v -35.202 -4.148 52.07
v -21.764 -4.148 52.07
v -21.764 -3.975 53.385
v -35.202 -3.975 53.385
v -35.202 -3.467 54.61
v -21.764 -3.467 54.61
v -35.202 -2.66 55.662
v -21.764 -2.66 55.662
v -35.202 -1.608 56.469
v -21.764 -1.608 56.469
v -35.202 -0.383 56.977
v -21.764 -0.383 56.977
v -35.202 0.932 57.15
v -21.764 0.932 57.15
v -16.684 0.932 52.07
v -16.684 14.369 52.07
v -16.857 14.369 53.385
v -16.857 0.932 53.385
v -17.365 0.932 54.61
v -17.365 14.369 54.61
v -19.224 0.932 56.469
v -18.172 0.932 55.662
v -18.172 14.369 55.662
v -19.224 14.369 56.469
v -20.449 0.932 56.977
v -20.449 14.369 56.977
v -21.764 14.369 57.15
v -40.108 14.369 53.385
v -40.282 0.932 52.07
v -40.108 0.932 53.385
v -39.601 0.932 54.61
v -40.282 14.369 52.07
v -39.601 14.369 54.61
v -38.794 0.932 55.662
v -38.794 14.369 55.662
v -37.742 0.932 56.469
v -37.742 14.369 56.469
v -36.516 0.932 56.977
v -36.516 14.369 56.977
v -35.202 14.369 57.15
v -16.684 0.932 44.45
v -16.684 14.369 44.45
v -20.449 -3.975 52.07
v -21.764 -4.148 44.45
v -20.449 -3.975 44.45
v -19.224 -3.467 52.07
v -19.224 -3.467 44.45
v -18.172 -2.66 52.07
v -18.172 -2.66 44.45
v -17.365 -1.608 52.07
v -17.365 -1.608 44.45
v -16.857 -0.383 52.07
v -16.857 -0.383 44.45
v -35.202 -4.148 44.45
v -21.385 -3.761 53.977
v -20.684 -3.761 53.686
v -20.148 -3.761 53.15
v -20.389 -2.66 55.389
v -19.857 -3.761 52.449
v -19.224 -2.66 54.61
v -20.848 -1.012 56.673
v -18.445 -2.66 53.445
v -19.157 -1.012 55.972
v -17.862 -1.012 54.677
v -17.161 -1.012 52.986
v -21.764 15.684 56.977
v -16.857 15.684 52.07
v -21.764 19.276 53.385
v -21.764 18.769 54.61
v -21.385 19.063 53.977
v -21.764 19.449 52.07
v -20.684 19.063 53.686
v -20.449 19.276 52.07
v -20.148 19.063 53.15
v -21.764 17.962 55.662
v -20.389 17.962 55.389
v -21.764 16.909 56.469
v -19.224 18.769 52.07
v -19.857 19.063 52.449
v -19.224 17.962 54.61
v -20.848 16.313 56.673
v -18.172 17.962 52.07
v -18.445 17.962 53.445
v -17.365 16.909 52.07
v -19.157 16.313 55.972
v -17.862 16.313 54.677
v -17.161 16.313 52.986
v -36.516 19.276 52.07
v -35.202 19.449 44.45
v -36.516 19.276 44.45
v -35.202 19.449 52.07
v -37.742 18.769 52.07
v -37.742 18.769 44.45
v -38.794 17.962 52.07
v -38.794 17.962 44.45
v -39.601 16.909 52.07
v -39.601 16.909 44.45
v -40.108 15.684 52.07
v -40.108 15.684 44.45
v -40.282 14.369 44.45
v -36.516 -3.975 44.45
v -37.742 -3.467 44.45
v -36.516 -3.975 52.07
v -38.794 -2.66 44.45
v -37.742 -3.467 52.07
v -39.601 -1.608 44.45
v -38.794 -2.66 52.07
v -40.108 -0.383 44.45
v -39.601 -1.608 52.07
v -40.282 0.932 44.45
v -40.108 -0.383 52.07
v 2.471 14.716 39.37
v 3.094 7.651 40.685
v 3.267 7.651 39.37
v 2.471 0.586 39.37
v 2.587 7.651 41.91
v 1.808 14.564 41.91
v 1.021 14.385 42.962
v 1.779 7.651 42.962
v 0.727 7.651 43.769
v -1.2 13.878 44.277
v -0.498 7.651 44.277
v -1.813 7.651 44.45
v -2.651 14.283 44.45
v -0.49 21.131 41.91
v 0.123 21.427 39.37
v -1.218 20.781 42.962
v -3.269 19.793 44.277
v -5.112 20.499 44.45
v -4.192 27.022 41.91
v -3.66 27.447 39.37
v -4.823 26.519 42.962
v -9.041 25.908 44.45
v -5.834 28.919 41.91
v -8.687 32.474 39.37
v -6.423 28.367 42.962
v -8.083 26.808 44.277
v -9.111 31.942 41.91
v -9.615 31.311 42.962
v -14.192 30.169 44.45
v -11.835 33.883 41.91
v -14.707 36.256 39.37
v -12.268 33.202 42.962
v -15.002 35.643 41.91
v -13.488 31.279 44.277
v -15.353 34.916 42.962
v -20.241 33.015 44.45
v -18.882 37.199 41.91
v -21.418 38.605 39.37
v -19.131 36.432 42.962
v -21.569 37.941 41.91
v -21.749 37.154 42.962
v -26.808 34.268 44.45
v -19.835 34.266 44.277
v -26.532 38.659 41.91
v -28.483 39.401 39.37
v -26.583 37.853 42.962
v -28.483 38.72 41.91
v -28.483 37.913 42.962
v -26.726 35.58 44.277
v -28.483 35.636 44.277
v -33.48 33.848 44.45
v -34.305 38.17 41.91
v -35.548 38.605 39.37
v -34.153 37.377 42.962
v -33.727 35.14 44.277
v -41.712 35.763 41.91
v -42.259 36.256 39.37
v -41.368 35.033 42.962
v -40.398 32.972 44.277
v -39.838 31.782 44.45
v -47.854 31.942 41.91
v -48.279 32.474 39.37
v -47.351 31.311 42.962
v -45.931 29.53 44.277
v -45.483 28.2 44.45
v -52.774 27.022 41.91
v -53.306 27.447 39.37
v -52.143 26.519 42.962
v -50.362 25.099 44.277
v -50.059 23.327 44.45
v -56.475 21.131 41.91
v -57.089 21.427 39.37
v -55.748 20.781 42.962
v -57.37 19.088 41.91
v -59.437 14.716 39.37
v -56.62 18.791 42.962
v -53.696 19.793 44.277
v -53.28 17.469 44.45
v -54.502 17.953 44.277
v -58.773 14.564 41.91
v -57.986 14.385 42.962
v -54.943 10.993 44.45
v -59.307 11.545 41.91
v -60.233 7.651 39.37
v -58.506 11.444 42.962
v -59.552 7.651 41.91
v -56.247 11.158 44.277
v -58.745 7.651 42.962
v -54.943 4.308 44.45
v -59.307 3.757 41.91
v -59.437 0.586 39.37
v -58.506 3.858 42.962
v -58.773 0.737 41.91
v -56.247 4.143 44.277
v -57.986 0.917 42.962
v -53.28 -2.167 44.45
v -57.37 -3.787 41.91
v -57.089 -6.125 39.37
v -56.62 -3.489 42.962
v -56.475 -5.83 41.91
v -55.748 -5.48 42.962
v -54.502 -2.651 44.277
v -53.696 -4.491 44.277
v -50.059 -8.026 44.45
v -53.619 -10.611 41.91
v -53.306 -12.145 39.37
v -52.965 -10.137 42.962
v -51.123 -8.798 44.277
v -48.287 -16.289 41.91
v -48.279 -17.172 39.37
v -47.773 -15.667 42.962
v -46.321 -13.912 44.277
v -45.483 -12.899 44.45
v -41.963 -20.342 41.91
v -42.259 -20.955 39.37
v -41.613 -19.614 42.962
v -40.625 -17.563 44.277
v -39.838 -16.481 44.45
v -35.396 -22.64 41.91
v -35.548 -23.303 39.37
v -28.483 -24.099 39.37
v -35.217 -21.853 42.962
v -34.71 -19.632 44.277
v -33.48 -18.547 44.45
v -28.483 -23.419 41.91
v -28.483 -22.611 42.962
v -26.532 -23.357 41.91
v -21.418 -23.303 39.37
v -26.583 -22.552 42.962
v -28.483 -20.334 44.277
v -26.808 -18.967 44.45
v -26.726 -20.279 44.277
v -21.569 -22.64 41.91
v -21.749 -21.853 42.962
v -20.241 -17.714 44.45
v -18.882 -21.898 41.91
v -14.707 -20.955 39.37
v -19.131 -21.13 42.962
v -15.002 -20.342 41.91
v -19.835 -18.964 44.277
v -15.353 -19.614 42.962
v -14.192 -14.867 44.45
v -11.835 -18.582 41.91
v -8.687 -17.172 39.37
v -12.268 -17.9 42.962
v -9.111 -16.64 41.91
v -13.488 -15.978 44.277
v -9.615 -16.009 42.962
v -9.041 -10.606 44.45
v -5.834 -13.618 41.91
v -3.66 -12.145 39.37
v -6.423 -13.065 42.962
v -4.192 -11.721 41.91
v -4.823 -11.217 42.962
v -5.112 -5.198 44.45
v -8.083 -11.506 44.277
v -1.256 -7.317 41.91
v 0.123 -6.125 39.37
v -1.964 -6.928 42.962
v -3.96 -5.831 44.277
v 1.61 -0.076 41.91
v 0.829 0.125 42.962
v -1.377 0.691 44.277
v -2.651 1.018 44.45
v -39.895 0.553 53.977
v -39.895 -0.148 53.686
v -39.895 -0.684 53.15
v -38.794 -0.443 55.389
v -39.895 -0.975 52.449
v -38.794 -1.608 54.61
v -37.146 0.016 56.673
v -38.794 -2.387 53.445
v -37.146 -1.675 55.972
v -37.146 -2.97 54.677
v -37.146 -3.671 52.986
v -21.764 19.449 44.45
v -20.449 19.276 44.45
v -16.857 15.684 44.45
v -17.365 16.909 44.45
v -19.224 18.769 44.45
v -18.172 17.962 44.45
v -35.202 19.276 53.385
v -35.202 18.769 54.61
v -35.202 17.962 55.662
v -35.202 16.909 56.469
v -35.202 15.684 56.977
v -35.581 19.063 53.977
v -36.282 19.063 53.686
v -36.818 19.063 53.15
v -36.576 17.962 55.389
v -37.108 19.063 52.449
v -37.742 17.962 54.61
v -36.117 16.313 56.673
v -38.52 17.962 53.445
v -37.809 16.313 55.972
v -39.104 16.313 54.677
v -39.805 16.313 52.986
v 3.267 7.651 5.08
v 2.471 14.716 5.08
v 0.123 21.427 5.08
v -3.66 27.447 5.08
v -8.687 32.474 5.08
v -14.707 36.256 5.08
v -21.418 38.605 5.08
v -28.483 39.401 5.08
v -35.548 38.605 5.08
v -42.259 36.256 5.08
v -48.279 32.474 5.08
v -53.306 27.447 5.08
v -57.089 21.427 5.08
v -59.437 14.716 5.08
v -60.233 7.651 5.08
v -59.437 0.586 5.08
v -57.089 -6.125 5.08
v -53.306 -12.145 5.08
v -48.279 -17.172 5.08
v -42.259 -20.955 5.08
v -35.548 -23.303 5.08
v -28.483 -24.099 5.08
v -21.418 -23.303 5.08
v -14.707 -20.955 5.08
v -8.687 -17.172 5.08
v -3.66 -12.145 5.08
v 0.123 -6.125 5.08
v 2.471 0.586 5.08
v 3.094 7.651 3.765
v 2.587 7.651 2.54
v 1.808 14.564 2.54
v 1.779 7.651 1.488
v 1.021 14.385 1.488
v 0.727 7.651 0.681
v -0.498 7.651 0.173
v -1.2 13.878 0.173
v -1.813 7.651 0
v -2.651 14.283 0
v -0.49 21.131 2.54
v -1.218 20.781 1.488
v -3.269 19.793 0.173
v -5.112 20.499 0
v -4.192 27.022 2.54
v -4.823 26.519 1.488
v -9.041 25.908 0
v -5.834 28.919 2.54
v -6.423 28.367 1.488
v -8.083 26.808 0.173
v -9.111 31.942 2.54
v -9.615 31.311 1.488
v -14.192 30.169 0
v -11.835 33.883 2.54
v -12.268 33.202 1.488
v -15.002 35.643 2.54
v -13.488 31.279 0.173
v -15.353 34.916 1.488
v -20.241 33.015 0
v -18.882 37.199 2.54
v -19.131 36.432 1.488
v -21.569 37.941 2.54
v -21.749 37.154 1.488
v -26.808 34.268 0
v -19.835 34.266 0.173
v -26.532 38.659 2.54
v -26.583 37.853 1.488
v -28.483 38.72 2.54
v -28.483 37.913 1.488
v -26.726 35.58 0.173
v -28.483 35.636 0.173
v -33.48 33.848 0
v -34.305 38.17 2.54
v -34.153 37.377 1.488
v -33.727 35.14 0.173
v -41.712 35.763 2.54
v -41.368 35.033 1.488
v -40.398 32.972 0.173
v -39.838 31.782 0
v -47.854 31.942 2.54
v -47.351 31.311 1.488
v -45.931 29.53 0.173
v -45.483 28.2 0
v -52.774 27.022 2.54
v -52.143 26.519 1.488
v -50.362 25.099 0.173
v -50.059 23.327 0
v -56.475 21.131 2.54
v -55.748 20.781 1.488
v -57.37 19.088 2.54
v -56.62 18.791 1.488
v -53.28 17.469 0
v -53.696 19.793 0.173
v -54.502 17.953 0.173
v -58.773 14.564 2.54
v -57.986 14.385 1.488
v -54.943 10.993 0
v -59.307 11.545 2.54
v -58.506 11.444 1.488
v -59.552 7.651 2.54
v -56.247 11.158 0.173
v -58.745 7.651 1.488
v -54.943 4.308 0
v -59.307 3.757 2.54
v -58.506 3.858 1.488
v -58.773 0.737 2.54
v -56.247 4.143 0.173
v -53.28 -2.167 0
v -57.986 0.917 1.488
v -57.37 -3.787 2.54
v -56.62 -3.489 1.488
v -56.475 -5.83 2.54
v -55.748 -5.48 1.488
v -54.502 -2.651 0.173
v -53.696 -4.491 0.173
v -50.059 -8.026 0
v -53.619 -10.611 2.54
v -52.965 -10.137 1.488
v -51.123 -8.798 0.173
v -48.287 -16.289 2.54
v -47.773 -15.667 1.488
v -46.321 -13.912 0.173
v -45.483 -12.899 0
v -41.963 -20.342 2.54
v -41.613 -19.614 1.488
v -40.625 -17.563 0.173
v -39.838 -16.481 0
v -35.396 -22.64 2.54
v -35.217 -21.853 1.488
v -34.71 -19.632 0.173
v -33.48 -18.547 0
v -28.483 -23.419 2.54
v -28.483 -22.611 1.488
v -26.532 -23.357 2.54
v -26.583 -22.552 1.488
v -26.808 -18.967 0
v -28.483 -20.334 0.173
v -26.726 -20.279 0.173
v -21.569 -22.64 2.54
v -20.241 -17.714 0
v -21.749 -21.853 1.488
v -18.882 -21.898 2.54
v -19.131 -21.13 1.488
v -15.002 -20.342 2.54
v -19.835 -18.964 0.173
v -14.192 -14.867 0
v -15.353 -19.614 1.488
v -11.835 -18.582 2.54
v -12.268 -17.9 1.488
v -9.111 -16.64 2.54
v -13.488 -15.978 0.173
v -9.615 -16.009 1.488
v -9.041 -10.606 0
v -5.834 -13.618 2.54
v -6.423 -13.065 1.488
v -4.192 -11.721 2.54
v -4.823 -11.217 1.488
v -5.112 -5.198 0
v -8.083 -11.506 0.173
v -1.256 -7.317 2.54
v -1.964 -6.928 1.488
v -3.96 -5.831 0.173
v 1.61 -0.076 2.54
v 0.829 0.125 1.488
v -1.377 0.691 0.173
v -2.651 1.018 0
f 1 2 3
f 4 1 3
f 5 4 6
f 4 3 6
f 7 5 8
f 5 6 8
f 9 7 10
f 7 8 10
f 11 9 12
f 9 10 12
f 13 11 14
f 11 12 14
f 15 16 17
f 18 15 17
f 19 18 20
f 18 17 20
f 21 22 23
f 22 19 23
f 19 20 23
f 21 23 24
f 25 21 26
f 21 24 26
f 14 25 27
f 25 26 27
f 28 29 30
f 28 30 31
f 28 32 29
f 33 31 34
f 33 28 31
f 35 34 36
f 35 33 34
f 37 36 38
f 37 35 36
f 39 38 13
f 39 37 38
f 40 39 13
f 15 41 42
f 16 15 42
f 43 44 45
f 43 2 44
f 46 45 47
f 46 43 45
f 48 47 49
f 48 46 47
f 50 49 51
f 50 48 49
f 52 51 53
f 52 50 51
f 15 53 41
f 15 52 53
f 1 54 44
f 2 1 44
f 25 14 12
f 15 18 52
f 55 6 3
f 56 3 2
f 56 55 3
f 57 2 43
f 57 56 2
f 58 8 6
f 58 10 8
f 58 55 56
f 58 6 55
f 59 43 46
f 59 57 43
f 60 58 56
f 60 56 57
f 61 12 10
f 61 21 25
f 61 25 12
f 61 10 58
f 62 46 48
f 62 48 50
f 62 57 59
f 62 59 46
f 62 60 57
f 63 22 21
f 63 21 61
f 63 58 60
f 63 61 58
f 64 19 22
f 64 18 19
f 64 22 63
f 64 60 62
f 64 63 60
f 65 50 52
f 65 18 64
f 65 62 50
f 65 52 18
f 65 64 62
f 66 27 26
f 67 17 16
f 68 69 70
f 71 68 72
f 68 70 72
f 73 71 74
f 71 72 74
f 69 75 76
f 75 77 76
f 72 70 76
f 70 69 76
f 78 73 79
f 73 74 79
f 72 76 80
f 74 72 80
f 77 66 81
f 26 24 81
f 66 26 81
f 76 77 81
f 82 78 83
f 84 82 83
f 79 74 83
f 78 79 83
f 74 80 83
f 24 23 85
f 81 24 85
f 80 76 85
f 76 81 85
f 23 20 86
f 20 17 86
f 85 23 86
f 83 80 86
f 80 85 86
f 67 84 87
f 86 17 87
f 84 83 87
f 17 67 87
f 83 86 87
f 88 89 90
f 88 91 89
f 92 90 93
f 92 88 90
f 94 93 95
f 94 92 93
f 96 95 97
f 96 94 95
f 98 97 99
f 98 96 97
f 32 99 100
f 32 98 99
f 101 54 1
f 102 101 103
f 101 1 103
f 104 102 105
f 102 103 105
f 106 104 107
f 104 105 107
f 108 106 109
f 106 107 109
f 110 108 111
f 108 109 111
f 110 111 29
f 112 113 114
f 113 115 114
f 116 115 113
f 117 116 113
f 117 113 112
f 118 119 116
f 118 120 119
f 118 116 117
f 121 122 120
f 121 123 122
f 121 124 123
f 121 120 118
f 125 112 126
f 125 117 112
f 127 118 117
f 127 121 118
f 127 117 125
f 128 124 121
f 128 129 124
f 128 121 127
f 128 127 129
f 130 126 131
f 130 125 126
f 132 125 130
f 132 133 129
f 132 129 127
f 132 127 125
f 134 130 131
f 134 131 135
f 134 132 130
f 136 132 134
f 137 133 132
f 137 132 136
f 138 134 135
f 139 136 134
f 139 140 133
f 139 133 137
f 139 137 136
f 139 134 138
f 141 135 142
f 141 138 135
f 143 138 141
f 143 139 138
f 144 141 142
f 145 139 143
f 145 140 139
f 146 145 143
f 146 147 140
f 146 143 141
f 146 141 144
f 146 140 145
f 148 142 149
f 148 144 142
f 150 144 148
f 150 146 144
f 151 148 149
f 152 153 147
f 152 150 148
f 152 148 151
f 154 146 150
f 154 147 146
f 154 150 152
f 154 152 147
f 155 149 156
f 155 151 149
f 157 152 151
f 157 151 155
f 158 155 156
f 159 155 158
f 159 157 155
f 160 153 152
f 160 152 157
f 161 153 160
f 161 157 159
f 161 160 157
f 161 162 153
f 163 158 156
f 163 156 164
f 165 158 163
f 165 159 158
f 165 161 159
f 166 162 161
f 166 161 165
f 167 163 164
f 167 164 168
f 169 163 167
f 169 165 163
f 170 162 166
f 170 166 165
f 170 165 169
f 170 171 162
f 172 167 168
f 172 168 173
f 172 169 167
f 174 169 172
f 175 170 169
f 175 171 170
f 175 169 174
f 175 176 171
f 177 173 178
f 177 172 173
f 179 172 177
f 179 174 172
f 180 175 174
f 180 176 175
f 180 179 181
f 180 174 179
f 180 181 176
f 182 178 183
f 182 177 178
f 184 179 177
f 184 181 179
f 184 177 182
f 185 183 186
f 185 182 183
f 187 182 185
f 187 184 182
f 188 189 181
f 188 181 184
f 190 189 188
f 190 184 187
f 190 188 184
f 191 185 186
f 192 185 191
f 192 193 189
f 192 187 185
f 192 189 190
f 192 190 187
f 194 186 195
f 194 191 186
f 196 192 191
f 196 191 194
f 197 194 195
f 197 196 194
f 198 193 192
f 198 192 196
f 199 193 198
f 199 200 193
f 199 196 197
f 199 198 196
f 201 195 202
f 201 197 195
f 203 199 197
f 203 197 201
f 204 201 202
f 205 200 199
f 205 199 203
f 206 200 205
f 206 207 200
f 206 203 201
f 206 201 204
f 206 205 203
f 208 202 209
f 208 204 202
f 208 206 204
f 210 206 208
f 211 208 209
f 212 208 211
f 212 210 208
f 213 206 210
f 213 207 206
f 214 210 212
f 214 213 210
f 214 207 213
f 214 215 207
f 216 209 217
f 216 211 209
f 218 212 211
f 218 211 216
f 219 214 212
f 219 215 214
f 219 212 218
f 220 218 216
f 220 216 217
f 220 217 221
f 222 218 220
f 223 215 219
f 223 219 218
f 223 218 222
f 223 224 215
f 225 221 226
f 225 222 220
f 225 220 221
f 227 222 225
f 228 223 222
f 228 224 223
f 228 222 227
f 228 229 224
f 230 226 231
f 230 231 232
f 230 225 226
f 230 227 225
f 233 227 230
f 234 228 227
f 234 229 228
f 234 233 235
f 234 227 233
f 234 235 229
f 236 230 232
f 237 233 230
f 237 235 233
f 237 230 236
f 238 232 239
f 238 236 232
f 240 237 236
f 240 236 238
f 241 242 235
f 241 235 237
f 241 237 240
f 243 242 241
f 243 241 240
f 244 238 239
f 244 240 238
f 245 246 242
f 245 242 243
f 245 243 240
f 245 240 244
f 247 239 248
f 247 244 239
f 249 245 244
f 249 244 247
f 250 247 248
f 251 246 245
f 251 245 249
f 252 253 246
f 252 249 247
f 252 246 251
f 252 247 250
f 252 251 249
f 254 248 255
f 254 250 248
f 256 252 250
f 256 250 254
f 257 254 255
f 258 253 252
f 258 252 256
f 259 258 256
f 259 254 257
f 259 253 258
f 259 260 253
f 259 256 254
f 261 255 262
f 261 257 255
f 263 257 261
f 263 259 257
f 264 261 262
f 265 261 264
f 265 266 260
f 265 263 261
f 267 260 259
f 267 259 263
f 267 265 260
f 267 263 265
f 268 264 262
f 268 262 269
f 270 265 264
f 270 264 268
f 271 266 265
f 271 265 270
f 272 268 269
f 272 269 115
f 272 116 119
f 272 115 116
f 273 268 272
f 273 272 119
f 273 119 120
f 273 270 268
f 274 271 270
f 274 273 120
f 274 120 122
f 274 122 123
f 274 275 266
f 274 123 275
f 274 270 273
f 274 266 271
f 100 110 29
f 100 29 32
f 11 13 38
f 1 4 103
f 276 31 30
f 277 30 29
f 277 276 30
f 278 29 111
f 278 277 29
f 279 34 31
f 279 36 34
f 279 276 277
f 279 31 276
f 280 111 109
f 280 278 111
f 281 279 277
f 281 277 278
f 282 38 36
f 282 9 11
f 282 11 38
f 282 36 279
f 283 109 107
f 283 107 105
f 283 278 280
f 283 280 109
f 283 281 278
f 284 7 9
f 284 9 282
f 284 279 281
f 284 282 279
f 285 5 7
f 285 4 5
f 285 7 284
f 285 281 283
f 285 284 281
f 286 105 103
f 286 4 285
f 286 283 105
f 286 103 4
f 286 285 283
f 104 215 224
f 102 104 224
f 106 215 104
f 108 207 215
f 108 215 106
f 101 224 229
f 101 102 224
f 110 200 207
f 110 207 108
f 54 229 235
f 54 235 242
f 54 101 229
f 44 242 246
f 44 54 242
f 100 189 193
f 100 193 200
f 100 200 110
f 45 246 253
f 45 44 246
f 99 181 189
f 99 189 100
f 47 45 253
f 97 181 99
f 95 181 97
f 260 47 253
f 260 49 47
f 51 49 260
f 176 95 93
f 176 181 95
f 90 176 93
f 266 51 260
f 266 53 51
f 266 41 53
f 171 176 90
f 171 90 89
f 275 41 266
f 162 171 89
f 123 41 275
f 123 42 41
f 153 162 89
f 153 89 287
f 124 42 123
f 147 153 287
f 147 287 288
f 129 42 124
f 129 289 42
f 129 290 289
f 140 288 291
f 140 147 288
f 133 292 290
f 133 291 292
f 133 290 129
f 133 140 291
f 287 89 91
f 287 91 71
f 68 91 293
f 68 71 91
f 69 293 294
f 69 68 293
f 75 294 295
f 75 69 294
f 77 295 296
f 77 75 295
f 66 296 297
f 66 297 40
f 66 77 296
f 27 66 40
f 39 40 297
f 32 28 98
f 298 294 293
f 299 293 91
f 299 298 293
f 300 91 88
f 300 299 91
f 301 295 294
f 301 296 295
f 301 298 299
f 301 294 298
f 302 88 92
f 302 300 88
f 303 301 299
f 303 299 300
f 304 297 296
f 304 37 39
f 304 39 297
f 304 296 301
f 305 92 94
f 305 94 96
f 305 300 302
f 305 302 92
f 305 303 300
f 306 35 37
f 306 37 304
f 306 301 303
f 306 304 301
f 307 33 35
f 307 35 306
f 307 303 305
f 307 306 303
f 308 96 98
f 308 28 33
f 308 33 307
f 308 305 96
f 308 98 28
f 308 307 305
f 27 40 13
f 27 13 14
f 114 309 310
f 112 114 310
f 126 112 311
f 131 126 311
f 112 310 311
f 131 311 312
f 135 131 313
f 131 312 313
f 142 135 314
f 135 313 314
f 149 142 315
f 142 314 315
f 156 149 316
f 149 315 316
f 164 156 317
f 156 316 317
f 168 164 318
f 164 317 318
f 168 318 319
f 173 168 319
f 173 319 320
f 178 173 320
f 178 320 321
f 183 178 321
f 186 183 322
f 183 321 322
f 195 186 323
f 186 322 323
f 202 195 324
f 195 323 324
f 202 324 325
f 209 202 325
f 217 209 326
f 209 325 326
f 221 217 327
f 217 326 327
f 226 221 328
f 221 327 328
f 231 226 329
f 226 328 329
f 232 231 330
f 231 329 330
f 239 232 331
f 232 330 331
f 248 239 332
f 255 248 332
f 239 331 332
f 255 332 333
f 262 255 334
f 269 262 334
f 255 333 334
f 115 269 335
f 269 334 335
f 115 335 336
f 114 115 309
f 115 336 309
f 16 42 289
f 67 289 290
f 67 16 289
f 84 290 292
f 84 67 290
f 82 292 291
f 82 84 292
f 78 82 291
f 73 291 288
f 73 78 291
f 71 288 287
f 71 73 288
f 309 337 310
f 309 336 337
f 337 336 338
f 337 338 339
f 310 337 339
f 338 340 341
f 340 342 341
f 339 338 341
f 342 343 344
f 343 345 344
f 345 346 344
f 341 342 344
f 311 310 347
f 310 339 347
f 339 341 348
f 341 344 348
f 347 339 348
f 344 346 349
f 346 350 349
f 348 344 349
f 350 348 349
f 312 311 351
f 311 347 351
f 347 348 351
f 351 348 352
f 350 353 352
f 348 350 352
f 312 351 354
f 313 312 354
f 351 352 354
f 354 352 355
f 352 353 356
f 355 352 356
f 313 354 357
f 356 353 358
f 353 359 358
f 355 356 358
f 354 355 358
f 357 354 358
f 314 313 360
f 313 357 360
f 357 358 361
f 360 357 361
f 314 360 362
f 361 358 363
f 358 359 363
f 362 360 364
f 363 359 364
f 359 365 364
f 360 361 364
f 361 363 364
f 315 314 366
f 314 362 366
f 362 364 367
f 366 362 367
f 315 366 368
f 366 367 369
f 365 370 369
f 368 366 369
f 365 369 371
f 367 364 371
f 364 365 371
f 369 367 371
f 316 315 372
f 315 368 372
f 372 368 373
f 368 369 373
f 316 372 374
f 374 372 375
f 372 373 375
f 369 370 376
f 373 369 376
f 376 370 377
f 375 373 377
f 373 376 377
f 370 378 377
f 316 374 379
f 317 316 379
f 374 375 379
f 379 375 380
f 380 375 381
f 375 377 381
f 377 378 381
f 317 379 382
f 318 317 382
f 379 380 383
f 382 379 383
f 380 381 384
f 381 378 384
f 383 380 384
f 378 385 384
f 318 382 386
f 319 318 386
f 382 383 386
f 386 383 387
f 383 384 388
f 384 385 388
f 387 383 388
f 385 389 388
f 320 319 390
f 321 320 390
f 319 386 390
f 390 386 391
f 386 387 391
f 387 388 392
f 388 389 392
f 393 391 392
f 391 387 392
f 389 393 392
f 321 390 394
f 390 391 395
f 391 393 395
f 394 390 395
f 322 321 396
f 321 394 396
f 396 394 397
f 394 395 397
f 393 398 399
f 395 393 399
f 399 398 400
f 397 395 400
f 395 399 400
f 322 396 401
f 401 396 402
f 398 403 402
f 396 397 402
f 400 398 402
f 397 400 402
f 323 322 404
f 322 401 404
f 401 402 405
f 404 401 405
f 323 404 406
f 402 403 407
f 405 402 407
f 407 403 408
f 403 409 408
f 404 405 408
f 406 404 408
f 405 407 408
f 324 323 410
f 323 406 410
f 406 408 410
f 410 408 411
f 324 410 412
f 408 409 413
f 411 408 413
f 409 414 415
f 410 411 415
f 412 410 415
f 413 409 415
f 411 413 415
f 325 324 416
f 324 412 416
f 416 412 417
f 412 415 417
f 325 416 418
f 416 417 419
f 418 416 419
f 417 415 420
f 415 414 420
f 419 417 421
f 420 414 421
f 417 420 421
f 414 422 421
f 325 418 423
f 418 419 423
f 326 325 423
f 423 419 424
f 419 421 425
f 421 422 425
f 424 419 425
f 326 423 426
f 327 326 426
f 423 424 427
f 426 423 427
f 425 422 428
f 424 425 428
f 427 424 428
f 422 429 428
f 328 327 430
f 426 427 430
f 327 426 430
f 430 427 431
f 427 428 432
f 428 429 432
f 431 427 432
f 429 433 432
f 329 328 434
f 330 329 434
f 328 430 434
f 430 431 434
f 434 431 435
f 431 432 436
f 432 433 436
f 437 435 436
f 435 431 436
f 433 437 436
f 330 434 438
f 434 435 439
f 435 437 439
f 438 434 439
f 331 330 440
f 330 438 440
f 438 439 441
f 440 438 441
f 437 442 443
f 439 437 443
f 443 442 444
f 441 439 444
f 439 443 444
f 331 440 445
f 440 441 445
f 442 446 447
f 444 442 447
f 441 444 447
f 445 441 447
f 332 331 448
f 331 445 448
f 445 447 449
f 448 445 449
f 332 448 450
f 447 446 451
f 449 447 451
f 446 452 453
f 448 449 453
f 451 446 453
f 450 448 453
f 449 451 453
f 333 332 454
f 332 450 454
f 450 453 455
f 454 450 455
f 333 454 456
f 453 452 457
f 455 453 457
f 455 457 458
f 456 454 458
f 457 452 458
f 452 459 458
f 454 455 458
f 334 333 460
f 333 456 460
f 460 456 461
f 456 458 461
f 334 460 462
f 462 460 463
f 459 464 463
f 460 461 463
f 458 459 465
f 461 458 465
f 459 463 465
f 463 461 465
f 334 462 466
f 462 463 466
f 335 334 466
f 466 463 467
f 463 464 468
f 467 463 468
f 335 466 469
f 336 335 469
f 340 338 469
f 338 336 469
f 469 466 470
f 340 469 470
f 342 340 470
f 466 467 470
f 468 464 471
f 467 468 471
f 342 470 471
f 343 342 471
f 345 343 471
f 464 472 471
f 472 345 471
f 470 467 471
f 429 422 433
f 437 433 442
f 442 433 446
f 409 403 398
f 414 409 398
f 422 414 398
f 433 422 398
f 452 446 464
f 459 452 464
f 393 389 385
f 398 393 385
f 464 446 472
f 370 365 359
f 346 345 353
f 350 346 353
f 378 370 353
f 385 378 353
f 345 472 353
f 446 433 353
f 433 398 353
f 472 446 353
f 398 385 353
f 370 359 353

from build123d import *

# Parameters (mm, degrees)
F0_R     = 31.75
F1_DEPTH = 44.45
F2_W     = 23.59742
F2_H     = 23.59742
F3_DEPTH = 12.7
F4_R     = 5.08


with BuildPart() as f1:
    # F0 (on Top) → F1 (new body)
    with BuildSketch(Plane.XY):
        with Locations((-28.482823, 7.650726)):
            Circle(F0_R)
    extrude(amount=F1_DEPTH)

    # F2 (on face) → F3 (join)
    with BuildSketch(Plane.XY.offset(44.45)):
        with Locations((-28.482823, 7.650726)):
            Rectangle(F2_W, F2_H)
    extrude(amount=F3_DEPTH)

    # F4
    f4_edges = [f1.edges().sort_by_distance(p)[0] for p in [
        (-60.232823, 7.650726, 44.45),
        (-60.232823, 7.650726, 0),
        (-16.684113, 7.650726, 57.15),
        (-28.482823, -4.147984, 57.15),
        (-40.281533, 7.650726, 57.15),
        (-28.482823, 19.449436, 57.15),
        (-16.684113, -4.147984, 50.8),
        (-40.281533, -4.147984, 50.8),
        (-16.684113, 19.449436, 50.8),
        (-40.281533, 19.449436, 50.8),
    ]]
    fillet(f4_edges, radius=F4_R)


solid = f1.part
